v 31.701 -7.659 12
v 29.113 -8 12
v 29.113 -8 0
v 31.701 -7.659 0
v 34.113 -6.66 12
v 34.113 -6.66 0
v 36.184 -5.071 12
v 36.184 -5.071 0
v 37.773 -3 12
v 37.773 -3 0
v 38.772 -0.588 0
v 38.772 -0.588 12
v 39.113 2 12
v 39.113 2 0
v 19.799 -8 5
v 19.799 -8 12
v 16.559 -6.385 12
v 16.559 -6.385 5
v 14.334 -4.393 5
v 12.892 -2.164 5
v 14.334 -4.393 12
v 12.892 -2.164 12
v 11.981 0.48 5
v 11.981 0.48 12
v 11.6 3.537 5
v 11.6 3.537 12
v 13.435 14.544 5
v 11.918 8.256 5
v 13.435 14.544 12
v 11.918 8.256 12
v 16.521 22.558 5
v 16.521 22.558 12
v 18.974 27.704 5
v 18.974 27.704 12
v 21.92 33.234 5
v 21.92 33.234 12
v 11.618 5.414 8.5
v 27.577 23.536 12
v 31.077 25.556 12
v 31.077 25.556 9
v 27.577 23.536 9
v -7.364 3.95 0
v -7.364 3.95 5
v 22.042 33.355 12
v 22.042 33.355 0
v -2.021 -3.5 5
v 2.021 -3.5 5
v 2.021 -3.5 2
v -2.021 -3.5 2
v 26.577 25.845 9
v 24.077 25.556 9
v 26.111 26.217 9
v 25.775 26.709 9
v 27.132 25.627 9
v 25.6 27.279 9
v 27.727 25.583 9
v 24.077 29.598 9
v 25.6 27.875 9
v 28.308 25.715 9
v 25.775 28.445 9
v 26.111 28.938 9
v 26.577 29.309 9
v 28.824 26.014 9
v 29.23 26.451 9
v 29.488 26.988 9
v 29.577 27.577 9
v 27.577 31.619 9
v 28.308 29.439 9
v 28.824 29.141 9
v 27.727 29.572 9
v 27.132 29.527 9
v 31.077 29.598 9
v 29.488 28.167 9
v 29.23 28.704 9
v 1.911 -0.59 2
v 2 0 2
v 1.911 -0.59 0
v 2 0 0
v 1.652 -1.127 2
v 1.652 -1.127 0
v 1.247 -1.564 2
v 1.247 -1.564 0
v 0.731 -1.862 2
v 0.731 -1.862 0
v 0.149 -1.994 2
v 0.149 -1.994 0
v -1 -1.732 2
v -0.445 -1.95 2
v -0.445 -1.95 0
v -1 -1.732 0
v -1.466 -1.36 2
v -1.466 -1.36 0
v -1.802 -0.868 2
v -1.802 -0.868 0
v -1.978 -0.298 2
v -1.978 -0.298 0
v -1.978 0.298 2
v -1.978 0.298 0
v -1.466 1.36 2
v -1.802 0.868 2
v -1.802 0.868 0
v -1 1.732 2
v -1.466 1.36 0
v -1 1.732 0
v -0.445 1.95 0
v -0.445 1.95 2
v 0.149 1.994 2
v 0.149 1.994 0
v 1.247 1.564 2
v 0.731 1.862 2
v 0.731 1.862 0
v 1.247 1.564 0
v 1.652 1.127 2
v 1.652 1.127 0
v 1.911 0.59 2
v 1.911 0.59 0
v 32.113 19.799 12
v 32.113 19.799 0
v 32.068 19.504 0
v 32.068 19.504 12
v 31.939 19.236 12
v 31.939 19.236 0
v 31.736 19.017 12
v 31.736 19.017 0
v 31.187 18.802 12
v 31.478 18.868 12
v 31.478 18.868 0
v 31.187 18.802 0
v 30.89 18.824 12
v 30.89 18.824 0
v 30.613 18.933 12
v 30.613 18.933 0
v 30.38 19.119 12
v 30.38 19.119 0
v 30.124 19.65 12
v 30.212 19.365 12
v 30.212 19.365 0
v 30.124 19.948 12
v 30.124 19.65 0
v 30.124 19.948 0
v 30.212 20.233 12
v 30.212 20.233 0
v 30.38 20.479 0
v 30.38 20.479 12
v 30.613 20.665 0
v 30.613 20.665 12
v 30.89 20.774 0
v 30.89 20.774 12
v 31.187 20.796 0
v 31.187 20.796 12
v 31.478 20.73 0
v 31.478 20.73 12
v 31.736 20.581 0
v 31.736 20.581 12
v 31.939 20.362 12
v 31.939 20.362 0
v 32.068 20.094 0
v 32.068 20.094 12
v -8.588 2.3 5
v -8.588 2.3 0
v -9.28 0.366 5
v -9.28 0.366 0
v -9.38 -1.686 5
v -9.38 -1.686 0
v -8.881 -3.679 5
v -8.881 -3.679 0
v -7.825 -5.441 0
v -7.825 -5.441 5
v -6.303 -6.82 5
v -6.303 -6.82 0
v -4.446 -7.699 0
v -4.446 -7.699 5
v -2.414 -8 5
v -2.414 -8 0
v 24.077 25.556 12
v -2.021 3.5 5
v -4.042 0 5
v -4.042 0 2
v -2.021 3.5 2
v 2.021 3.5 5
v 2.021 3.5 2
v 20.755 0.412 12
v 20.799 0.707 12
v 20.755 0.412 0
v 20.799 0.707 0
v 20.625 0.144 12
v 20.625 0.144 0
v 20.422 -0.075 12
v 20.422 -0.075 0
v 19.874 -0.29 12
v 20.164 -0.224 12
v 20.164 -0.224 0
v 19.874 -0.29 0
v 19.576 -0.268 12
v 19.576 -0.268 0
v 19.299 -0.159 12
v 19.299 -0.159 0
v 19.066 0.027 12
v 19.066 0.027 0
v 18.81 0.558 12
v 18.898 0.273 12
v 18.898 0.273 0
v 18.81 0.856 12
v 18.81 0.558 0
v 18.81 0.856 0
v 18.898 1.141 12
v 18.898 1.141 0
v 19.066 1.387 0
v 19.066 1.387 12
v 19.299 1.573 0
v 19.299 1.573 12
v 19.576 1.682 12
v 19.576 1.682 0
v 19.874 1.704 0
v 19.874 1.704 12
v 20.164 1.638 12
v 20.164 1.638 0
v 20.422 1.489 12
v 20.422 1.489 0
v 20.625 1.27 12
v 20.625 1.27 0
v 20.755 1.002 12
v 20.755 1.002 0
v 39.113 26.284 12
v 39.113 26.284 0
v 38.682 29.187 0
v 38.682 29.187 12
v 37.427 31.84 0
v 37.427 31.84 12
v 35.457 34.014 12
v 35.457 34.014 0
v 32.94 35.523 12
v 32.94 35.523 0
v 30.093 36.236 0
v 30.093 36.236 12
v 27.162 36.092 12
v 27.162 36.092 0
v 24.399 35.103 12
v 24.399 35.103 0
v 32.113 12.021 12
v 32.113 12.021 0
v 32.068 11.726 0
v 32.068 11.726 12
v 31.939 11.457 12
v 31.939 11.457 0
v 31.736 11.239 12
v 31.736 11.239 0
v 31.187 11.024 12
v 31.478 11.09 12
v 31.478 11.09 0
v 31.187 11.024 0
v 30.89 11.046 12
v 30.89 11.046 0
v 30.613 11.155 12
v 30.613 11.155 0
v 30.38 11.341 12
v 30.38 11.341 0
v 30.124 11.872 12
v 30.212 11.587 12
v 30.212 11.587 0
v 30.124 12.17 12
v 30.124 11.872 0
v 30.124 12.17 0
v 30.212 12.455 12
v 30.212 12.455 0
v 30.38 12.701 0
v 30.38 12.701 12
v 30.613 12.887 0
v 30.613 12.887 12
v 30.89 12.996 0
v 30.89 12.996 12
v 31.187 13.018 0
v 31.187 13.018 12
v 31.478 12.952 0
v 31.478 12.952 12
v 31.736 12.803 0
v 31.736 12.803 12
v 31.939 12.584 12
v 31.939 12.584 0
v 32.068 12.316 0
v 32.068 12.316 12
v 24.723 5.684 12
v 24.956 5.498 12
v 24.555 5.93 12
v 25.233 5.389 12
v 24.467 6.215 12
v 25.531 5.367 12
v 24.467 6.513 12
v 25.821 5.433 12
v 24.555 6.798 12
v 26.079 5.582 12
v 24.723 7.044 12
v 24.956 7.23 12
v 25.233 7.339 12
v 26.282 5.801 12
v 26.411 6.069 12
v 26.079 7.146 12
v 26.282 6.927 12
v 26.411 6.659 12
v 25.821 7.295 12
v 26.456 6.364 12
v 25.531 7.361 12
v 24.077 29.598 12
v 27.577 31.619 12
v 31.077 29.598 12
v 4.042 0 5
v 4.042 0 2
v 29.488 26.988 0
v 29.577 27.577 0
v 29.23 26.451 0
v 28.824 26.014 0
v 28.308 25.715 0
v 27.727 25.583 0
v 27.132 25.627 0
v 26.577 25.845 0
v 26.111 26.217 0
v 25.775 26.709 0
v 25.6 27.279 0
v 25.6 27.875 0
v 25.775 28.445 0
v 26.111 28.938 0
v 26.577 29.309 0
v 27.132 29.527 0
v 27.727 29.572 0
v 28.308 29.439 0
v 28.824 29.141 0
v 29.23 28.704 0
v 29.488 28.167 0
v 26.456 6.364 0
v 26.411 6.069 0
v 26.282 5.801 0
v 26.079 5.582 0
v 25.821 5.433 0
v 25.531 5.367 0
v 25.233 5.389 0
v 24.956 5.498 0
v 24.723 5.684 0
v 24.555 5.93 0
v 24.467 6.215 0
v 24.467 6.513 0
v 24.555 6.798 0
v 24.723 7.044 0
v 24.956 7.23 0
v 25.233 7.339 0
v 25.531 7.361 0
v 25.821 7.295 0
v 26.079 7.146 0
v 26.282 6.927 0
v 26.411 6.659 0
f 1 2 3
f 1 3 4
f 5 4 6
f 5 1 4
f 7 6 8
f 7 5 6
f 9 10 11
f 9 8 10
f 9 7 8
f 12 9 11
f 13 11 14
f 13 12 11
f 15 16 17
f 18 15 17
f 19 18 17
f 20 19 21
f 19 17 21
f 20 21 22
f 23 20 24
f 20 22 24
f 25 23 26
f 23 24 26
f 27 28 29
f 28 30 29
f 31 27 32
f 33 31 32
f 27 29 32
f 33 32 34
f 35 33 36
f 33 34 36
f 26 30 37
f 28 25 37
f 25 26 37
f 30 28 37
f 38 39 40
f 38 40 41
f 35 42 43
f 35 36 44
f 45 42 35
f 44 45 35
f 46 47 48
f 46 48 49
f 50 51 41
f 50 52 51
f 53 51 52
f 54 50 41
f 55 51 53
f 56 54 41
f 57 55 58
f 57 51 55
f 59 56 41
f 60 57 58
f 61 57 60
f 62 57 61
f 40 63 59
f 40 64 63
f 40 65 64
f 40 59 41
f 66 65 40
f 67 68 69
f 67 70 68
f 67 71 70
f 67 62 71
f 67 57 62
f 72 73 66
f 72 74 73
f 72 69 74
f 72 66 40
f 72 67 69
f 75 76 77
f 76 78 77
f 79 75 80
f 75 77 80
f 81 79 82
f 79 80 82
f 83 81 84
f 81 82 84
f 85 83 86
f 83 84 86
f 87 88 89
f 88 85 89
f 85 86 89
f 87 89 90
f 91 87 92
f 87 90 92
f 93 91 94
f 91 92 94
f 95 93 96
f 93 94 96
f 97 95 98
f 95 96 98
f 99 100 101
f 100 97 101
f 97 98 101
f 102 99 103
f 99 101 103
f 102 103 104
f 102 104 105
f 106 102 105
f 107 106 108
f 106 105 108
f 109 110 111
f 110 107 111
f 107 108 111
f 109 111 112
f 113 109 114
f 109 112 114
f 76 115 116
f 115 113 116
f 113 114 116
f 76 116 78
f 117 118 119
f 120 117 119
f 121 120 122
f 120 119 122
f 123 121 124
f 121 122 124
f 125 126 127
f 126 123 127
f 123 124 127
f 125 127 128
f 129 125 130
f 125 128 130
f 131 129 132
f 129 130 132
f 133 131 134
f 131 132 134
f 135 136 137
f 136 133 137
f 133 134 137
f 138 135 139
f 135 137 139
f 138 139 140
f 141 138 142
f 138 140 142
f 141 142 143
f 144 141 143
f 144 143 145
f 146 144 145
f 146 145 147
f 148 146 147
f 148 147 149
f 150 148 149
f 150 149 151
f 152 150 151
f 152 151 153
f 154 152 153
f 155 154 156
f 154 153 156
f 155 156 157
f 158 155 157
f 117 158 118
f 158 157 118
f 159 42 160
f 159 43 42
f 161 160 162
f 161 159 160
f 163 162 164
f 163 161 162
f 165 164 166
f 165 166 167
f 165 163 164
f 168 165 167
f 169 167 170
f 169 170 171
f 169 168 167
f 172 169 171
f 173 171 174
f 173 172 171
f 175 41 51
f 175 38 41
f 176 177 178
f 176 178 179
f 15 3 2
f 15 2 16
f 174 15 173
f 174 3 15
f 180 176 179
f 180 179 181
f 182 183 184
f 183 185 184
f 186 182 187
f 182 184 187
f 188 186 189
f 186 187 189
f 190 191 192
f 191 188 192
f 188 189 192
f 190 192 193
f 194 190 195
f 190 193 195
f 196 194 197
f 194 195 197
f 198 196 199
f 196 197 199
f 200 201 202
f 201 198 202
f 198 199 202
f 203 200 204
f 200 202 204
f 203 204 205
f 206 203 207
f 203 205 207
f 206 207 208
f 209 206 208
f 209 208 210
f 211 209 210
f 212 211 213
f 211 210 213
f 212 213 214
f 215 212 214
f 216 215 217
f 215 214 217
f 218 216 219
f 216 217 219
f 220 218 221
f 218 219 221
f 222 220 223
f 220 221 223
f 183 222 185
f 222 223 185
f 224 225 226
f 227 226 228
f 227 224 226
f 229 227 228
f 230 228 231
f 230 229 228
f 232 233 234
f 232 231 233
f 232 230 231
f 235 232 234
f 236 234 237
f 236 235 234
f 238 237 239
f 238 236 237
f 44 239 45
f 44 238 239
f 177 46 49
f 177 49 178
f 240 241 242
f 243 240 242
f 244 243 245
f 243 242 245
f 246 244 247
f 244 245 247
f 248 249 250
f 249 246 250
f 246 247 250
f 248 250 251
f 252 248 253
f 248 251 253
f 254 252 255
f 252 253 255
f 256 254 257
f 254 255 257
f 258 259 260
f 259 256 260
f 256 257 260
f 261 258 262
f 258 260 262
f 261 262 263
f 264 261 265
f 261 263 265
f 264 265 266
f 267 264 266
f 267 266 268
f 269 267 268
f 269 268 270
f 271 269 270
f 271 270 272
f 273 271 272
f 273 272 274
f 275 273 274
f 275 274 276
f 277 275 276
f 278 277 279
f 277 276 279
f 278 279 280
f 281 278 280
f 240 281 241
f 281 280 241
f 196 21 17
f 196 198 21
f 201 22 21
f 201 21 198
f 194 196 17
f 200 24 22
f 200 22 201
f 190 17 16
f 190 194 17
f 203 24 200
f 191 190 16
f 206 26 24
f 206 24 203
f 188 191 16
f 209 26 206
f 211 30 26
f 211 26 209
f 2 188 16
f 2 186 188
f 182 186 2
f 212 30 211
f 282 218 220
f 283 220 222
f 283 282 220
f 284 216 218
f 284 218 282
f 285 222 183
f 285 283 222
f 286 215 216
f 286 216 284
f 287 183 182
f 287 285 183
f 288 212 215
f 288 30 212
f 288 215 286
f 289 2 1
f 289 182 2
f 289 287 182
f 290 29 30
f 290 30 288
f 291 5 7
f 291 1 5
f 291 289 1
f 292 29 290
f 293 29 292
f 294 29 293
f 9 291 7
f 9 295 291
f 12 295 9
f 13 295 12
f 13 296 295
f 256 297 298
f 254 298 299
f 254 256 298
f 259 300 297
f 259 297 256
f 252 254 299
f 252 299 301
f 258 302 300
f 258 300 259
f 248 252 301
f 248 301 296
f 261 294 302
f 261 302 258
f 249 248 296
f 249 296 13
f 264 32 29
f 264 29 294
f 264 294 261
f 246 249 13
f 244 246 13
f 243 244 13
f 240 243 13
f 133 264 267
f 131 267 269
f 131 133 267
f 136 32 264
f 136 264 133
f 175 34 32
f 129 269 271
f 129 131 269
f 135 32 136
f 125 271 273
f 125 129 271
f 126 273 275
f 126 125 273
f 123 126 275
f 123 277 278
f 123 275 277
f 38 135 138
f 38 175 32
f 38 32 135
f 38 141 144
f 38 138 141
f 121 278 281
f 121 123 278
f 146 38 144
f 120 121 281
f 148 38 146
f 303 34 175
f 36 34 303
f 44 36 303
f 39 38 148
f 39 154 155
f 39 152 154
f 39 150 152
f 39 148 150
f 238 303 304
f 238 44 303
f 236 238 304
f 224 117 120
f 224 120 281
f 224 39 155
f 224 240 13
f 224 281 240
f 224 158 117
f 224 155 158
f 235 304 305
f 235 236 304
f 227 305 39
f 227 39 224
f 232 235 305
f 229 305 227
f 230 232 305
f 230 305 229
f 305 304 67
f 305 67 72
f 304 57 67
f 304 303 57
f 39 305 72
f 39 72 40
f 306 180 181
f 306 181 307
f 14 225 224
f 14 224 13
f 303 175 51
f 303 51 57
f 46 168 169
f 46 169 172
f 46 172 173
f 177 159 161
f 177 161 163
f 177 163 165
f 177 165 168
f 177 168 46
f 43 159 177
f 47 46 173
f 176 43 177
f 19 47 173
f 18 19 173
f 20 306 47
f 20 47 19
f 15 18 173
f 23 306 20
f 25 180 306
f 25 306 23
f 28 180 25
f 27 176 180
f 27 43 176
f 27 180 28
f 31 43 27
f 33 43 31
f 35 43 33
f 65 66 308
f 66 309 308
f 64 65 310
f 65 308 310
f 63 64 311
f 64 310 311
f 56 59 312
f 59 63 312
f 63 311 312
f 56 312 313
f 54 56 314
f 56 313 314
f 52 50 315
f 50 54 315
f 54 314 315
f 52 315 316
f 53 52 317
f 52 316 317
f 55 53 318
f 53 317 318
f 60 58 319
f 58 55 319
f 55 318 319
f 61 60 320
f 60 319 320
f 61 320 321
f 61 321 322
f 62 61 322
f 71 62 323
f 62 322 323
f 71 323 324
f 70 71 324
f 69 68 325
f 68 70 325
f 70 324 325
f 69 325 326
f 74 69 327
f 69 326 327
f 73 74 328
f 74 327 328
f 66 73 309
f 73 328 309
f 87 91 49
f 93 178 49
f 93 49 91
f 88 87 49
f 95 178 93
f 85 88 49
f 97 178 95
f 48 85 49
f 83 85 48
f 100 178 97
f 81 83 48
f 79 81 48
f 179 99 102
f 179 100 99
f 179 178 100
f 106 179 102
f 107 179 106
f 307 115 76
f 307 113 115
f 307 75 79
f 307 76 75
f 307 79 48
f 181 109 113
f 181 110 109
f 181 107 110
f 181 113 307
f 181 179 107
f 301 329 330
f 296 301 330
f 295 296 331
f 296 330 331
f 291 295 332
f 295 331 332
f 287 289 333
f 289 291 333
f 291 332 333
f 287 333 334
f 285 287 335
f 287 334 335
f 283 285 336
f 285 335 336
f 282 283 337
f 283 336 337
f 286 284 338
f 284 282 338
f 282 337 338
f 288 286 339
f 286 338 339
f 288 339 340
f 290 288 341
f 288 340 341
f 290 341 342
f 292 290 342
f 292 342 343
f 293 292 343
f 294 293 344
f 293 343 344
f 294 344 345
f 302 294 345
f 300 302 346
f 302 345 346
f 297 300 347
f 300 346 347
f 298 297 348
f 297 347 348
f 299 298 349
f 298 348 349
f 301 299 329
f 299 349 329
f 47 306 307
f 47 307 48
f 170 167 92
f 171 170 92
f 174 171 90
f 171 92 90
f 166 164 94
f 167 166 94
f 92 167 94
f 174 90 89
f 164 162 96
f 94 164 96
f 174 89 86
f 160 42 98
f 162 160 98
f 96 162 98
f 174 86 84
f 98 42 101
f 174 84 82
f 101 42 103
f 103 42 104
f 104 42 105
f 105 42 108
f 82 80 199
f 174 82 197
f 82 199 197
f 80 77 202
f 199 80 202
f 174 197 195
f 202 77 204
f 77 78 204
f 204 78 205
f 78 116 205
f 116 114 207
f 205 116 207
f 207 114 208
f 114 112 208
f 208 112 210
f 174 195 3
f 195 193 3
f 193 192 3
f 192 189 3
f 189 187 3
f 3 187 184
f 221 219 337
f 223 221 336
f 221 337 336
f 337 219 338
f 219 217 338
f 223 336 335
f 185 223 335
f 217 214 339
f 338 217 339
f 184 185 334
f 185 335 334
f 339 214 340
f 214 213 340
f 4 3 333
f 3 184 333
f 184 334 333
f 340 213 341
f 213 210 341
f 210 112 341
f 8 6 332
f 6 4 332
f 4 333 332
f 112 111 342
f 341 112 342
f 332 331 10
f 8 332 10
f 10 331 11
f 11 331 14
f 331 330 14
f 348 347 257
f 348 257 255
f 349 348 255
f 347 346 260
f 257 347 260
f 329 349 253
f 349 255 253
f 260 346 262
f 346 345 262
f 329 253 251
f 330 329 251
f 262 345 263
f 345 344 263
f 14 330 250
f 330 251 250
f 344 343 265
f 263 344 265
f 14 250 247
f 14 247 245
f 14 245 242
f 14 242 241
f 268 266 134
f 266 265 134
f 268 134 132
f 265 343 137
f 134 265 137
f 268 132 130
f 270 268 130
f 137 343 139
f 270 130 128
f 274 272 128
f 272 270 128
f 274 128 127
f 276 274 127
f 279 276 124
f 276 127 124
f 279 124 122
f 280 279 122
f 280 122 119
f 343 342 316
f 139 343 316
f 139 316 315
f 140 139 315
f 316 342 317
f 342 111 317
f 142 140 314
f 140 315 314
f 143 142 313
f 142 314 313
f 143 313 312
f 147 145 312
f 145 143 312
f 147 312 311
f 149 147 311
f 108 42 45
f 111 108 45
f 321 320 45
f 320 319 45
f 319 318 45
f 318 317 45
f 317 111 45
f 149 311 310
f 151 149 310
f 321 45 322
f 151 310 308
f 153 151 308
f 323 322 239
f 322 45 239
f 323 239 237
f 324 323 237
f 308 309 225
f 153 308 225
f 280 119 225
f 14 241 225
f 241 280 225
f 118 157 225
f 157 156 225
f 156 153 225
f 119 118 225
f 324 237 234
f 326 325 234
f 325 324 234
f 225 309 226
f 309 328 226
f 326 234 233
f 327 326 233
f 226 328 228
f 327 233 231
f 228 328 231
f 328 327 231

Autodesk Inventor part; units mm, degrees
ref_plane "YZ Plane" through (0, 0, 0) normal (1, 0, 0) x (0, 1, 0)
ref_plane "XZ Plane" through (0, 0, 0) normal (0, 1, 0) x (-1, 0, 0)
ref_plane "XY Plane" through (0, 0, 0) normal (0, 0, 1) x (1, 0, 0)
sketch "Esquisse1" plane through (0, 0, 0) normal (0, 0, 1) x (1, 0, 0)
  line L0 (0, 0) -> (52, 0) construction
  line L1 (0, 0) -> (25.4558, 25.4558) construction
  line L2 (0, 0) -> (-9.5459, 9.5459) construction
  line L3 (-9.5459, 9.5459) -> (-4.9497, 14.1421) construction
  line L4 (-4.9497, 14.1421) -> (0.7071, 19.799) construction
  line L5 (0.7071, 19.799) -> (6.364, 25.4558) construction
  line L6 (6.364, 25.4558) -> (12.0208, 31.1127) construction
  line L7 (25.4558, 25.4558) -> (19.799, 31.1127) construction
  line L8 (0, 0) -> (27.5772, 27.5772) construction
  circle A0 centre (0.7071, 19.799) radius 1 construction
  circle A1 centre (6.364, 25.4558) radius 1 construction
  circle A2 centre (12.0208, 31.1127) radius 1 construction
  circle A3 centre (19.799, 31.1127) radius 1 construction
  circle A4 centre (19.799, 0.7071) radius 1
  circle A5 centre (25.4558, 6.364) radius 1
  circle A6 centre (31.1127, 12.0208) radius 1
  circle A7 centre (31.1127, 19.799) radius 1
  circle A8 centre (27.5772, 27.5772) radius 2
  circle A9 centre (0, 0) radius 2
  line L9 (0, 0) -> (0, -8) construction
  line L10 (31.1127, 12.0208) -> (39.1127, 12.0208) construction
  line L11 (39.1127, 50.4264) -> (39.1127, -8)
  line L12 (0, 0) -> (-5.6569, 5.6569) construction
  line L13 (39.1127, -8) -> (-19.3137, -8)
  line L14 (-19.3137, -8) -> (39.1127, 50.4264)
  dimension "d31" = 45
  dimension "d32" = 13.5
  dimension "d33" = 6.5
  dimension "d34" = 8
  dimension "d35" = 8
  dimension "d36" = 8
  dimension "d37" = 8
  dimension "d38" = 36
  dimension "d39" = 39
  dimension "d40" = 2
  dimension "d41" = 4
  dimension "d44" = 8
  dimension "d45" = 8
  dimension "d64" = 8
extrude "Extrusion7" add sketch "Esquisse1" along normal blind 12
sketch "Esquisse7" plane through (0, 0, 12) normal (0, 0, 1) x (1, 0, 0)
  circle A0 centre (0, 0) radius 2 projected
  circle A1 centre (27.5772, 27.5772) radius 2 projected
  circle A2 centre (19.799, 0.7071) radius 1 projected
  line L0 (39.1127, 50.4264) -> (-19.3137, -8) projected
  line L1 (-19.3137, -8) -> (39.1127, -8) projected
  circle A3 centre (0, 0) radius 12 construction
  circle A4 centre (19.799, 0.7071) radius 7.8116 construction
  circle A5 centre (27.5772, 27.5772) radius 8 construction
  line L2 (19.799, 0.7071) -> (19.799, -8) construction
  spline S0 degree 2 poles (19.799, -8) (2.3764, -1.7891) (21.9203, 33.234) knots 0 0 0 1 1 1
  point P0 (11.9924, 0.4283)
  dimension "d67" = 24
extrude "Extrusion8" cut sketch "Esquisse7" against normal blind 7 contours S0 L1 L0
sketch "Esquisse8" plane through (0, 0, 5) normal (0, 0, 1) x (1, 0, 0)
  circle A0 centre (0, 0) radius 2 projected
  line L0 (19.799, -8) -> (-19.3137, -8) projected
  line L1 (4.0415, 0) -> (2.0207, -3.5)
  line L2 (2.0207, -3.5) -> (-2.0207, -3.5)
  line L3 (-2.0207, -3.5) -> (-4.0415, 0)
  line L4 (-4.0415, 0) -> (-2.0207, 3.5)
  line L5 (-2.0207, 3.5) -> (2.0207, 3.5)
  line L6 (2.0207, 3.5) -> (4.0415, 0)
  line L7 (2.0207, 3.5) -> (2.0207, -3.5) construction
  dimension "d70" = 7
extrude "Extrusion9" cut sketch "Esquisse8" against normal blind 3
sketch "Esquisse9" plane through (0, 0, 12) normal (0, 0, 1) x (1, 0, 0)
  line L0 (39.1127, -8) -> (39.1127, 50.4264) projected
  circle A0 centre (27.5772, 27.5772) radius 2 projected
  line L1 (31.0772, 29.5979) -> (31.0772, 25.5564)
  line L2 (31.0772, 25.5564) -> (27.5772, 23.5357)
  line L3 (27.5772, 23.5357) -> (24.0772, 25.5564)
  line L4 (24.0772, 25.5564) -> (24.0772, 29.5979)
  line L5 (24.0772, 29.5979) -> (27.5772, 31.6186)
  line L6 (27.5772, 31.6186) -> (31.0772, 29.5979)
  line L7 (24.0772, 29.5979) -> (31.0772, 29.5979) construction
  point P0 (0, 0)
  dimension "d73" = 7
extrude "Extrusion10" cut sketch "Esquisse9" against normal blind 3
fillet "Congé2" radius 7 1 edges at (-19.3137, -8, 2.5)
fillet "Congé3" radius 10 1 edges at (39.1127, 50.4264, 6)
fillet "Congé4" radius 10 1 edges at (39.1127, -8, 6)
properties part number "joint1+ax12imprint"
